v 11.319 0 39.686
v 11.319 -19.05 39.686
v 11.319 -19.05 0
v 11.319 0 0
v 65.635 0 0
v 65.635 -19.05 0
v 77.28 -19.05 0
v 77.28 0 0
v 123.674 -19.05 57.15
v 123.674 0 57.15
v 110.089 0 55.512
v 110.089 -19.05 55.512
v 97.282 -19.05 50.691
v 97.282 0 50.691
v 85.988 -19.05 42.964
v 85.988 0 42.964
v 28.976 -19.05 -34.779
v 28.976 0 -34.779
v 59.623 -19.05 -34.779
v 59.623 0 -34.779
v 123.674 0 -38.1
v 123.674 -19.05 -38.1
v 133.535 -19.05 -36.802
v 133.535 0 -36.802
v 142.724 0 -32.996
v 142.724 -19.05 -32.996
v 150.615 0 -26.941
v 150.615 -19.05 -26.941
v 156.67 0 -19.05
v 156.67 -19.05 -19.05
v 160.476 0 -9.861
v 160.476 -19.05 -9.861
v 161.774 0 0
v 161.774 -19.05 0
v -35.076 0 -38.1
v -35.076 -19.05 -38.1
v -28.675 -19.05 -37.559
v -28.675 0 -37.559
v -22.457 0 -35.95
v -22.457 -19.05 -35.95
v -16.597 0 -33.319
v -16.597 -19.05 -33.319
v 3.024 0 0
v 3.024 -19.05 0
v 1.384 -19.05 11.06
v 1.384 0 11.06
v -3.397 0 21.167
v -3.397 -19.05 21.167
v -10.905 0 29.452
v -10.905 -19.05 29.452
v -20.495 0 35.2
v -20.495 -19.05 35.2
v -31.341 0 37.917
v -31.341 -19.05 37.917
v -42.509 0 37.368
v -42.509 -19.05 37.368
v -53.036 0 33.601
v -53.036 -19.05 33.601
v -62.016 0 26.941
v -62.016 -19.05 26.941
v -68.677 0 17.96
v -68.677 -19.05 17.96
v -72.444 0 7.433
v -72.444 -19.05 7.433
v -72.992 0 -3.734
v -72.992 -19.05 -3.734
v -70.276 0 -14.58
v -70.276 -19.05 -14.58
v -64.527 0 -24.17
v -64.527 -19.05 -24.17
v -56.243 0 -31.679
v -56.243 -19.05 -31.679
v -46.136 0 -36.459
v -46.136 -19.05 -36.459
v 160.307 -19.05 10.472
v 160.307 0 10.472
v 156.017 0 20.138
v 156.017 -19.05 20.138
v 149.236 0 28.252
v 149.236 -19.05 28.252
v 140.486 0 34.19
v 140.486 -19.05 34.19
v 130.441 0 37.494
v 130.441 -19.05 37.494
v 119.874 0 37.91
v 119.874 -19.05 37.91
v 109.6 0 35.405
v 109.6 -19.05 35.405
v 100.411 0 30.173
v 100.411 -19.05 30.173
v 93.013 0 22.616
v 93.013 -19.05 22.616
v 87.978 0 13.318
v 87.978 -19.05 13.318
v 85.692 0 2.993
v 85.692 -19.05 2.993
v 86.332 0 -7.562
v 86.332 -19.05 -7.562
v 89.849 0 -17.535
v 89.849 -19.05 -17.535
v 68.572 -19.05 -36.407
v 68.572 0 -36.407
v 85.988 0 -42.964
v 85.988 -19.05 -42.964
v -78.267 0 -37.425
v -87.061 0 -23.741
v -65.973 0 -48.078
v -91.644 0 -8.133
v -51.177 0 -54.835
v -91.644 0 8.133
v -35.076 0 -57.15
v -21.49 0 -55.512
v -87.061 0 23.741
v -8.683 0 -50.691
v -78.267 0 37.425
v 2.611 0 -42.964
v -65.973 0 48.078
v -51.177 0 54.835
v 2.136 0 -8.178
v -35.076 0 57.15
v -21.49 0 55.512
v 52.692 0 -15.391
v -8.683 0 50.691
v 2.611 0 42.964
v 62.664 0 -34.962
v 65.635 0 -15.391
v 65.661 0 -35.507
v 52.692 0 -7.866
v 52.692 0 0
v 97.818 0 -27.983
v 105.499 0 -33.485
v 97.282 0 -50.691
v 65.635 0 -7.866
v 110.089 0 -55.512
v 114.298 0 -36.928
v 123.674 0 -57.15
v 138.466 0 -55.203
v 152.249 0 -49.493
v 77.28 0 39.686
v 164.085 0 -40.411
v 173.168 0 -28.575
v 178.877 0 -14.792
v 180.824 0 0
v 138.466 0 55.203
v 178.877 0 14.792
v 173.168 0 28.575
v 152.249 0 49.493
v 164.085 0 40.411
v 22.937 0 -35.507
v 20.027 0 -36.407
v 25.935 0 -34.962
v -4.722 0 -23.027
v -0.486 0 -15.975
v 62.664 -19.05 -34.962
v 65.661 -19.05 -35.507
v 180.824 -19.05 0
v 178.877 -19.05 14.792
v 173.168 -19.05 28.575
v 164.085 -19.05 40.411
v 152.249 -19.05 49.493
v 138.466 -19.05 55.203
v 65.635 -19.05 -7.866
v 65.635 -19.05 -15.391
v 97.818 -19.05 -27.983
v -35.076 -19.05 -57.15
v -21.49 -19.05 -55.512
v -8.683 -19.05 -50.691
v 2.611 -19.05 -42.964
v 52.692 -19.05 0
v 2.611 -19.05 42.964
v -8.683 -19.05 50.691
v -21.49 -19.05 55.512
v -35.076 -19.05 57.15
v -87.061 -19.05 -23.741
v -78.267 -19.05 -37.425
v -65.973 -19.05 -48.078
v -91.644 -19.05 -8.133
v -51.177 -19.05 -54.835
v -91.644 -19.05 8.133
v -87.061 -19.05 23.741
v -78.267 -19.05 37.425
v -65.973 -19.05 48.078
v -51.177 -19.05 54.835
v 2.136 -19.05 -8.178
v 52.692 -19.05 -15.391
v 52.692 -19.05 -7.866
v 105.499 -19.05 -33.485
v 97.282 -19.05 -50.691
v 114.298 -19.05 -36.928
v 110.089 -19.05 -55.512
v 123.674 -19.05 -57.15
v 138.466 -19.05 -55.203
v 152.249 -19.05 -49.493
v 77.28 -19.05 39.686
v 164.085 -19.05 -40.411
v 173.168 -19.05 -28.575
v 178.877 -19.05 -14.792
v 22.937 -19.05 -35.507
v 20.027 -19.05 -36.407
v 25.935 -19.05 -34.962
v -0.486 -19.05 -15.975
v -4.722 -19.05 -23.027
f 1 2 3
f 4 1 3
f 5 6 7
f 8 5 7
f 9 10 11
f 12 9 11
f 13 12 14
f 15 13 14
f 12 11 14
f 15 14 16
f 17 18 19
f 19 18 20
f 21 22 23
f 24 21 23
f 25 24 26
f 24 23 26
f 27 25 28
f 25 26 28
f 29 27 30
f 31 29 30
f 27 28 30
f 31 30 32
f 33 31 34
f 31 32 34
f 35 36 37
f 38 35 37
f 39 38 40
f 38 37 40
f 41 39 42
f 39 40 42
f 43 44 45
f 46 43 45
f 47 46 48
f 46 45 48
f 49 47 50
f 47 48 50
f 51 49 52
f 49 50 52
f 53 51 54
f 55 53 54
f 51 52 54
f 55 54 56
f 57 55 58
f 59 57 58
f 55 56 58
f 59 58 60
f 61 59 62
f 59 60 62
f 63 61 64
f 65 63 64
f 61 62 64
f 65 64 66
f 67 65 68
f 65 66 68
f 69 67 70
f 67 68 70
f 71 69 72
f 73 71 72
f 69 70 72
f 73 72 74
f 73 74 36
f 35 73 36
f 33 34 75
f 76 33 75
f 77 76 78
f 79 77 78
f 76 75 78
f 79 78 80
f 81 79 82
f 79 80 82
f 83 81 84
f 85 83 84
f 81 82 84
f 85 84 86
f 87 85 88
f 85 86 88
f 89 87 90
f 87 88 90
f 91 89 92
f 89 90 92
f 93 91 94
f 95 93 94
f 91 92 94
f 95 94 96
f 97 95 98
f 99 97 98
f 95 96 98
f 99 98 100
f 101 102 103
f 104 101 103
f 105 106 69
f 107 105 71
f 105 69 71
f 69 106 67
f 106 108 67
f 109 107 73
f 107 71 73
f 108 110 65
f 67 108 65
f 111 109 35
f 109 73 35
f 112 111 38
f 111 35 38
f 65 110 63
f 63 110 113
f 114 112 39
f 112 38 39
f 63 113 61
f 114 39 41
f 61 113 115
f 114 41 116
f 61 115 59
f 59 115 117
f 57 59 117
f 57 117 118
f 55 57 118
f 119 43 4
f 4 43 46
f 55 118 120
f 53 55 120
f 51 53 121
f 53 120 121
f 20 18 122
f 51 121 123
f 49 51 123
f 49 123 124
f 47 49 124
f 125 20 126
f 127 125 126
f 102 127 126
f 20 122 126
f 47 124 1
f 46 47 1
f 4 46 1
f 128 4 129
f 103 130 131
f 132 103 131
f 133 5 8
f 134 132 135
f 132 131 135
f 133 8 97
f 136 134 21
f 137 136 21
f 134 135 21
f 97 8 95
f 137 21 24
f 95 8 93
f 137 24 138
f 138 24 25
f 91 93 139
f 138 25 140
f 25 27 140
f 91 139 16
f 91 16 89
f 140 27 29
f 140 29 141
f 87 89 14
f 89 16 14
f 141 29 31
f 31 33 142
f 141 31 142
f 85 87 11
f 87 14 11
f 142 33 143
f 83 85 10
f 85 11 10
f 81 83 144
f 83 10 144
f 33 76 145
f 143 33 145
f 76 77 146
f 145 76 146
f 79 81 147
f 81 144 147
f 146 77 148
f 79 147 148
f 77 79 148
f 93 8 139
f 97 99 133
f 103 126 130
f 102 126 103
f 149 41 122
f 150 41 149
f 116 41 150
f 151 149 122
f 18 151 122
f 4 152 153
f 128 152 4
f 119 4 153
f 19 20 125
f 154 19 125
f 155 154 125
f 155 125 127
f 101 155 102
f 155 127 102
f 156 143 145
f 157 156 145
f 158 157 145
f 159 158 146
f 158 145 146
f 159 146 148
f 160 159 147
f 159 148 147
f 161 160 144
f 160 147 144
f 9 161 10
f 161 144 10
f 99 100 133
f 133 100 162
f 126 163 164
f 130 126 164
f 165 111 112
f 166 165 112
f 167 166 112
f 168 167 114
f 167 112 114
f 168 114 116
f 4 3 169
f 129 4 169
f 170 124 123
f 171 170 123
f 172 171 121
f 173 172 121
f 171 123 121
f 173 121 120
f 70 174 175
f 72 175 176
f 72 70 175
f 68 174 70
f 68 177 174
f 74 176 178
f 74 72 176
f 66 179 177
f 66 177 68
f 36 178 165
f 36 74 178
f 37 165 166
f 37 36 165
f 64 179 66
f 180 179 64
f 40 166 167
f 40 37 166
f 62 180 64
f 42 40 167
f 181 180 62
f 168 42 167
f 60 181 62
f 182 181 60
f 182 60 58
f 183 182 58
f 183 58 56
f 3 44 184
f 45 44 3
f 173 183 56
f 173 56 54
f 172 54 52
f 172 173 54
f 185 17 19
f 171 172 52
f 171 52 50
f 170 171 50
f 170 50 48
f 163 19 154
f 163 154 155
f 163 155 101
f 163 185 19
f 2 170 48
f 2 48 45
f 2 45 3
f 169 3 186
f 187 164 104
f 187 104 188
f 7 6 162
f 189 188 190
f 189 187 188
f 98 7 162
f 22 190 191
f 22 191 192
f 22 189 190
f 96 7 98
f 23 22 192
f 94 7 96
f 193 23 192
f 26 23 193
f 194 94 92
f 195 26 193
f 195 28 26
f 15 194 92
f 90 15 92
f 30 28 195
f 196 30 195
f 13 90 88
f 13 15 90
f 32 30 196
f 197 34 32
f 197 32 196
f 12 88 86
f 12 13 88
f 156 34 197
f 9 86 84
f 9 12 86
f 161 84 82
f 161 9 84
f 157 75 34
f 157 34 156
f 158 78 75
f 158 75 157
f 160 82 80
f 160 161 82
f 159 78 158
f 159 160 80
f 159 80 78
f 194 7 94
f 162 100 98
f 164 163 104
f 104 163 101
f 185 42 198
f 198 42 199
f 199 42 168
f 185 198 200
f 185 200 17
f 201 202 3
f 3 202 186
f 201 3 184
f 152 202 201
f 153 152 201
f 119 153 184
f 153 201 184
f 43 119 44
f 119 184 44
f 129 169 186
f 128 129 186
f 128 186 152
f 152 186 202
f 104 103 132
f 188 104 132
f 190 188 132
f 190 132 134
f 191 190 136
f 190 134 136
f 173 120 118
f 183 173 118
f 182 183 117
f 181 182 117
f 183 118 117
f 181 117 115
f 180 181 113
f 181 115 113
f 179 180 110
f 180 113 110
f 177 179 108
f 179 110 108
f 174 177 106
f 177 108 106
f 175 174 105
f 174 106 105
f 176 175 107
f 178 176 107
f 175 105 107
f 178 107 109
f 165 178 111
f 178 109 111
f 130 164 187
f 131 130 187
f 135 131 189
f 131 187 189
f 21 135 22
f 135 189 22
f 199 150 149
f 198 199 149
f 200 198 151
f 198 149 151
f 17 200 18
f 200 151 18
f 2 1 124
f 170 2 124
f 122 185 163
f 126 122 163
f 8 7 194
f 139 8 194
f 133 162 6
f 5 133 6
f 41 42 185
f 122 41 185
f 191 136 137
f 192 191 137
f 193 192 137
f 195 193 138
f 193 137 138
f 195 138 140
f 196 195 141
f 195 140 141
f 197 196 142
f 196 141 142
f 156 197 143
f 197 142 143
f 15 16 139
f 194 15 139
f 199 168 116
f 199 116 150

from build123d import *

# Parameters (mm, degrees)
F1_DEPTH = 19.05
F3_DEPTH = 25.4


with BuildPart() as f1:
    # F0 (on Front) → F1 (new body)
    with BuildSketch(Plane.XZ):
        with BuildLine():
            Line((20.027097595, 36.4074036121), (2.6105293283, 42.9636023111))
            ThreePointArc((2.6105293283, 42.9636023111), (16.9814393634, 23.5834144733), (22.0743066938, 0))
            ThreePointArc((22.0743066938, 0), (16.9814393634, -23.5834144733), (2.6105293283, -42.9636023111))
            Line((2.6105293283, -42.9636023111), (20.027097595, -36.4074036121))
            ThreePointArc((20.027097595, -36.4074036121), (24.4278254251, -35.189367606), (28.975523916, -34.7789341976))
            Line((28.975523916, -34.7789341976), (59.6230894717, -34.7789341976))
            ThreePointArc((59.6230894717, -34.7789341976), (64.1707879626, -35.189367606), (68.5715157927, -36.4074036121))
            Line((68.5715157927, -36.4074036121), (85.9880840594, -42.9636023111))
            ThreePointArc((85.9880840594, -42.9636023111), (66.5243066938, 0), (85.9880840594, 42.9636023111))
            Line((85.9880840594, 42.9636023111), (68.5715157927, 36.4074036121))
            ThreePointArc((68.5715157927, 36.4074036121), (64.1707879626, 35.189367606), (59.6230894717, 34.7789341976))
            Line((59.6230894717, 34.7789341976), (28.975523916, 34.7789341976))
            ThreePointArc((28.975523916, 34.7789341976), (24.4278254251, 35.189367606), (20.027097595, 36.4074036121))
        make_face()
        with BuildLine():
            ThreePointArc((2.6105293283, 42.9636023111), (-14.941734084, 53.4859438174), (-35.0756933062, 57.15))
            Line((-35.0756933062, 57.15), (2.6105293283, 42.9636023111))
        make_face()
        with BuildLine():
            Line((123.6743066938, 57.15), (85.9880840594, 42.9636023111))
            ThreePointArc((85.9880840594, 42.9636023111), (66.5243066938, 0), (85.9880840594, -42.9636023111))
            Line((85.9880840594, -42.9636023111), (123.6743066938, -57.15))
            ThreePointArc((123.6743066938, -57.15), (164.0854592386, -40.4111525448), (180.8243066938, 0))
            ThreePointArc((180.8243066938, 0), (164.0854592386, 40.4111525448), (123.6743066938, 57.15))
        make_face()
        with BuildLine():
            ThreePointArc((123.6743066938, 57.15), (103.5403474717, 53.4859438174), (85.9880840594, 42.9636023111))
            Line((85.9880840594, 42.9636023111), (123.6743066938, 57.15))
        make_face()
        with BuildLine():
            Line((2.6105293283, 42.9636023111), (-35.0756933062, 57.15))
            ThreePointArc((-35.0756933062, 57.15), (-92.2256933062, 0), (-35.0756933062, -57.15))
            Line((-35.0756933062, -57.15), (2.6105293283, -42.9636023111))
            ThreePointArc((2.6105293283, -42.9636023111), (16.9814393634, -23.5834144733), (22.0743066938, 0))
            ThreePointArc((22.0743066938, 0), (16.9814393634, 23.5834144733), (2.6105293283, 42.9636023111))
        make_face()
        with BuildLine():
            Line((2.6105293283, -42.9636023111), (-35.0756933062, -57.15))
            ThreePointArc((-35.0756933062, -57.15), (-14.941734084, -53.4859438174), (2.6105293283, -42.9636023111))
        make_face()
        with BuildLine():
            Line((123.6743066938, -57.15), (85.9880840594, -42.9636023111))
            ThreePointArc((85.9880840594, -42.9636023111), (103.5403474717, -53.4859438174), (123.6743066938, -57.15))
        make_face()
    extrude(amount=F1_DEPTH)

    # F2 (on face) → F3 (cut)
    with BuildSketch(Plane.XZ.offset(19.05)):
        with BuildLine():
            ThreePointArc((-4.721551, -23.0268548625), (1.0359587044, -12.1473696358), (3.0243066938, 0))
            ThreePointArc((3.0243066938, 0), (-62.0164616694, 26.9407683632), (-35.0756933062, -38.1))
            Line((-35.0756933062, -38.1), (-35.0756933062, -31.0422573239))
            Line((-35.0756933062, -31.0422573239), (-4.721551, -23.0268548625))
        make_face()
        with BuildLine():
            Line((-35.0756933062, -31.0422573239), (-35.0756933062, -38.1))
            Line((-35.0756933062, -38.1), (-16.5966969086, -33.3187138428))
            ThreePointArc((-16.5966969086, -33.3187138428), (-10.1227486056, -28.7916750254), (-4.721551, -23.0268548625))
            Line((-4.721551, -23.0268548625), (-35.0756933062, -31.0422573239))
        make_face()
        with BuildLine():
            Line((-16.5966969086, -33.3187138428), (-35.0756933062, -38.1))
            ThreePointArc((-35.0756933062, -38.1), (-25.5319256385, -36.8853154888), (-16.5966969086, -33.3187138428))
        make_face()
        with BuildLine():
            Line((52.6924617589, -7.8659448773), (-4.721551, -23.0268548625))
            ThreePointArc((-4.721551, -23.0268548625), (-10.1227486056, -28.7916750254), (-16.5966969086, -33.3187138428))
            Line((-16.5966969086, -33.3187138428), (52.6924617589, -15.3907220811))
            Line((52.6924617589, -15.3907220811), (65.6350776553, -15.3907220811))
            Line((65.6350776553, -15.3907220811), (97.817716181, -27.9829720911))
            ThreePointArc((97.817716181, -27.9829720911), (93.3797600536, -23.1052038265), (89.8493835117, -17.5352380003))
            Line((89.8493835117, -17.5352380003), (65.6350776553, -7.8659448773))
            Line((65.6350776553, -7.8659448773), (65.6350776553, 0))
            Line((65.6350776553, 0), (52.6924617589, 0))
            Line((52.6924617589, 0), (52.6924617589, -7.8659448773))
        make_face()
        with BuildLine():
            Line((11.3188134617, 0), (52.6924617589, 0))
            Line((52.6924617589, 0), (65.6350776553, 0))
            Line((65.6350776553, 0), (77.279799926, 0))
            Line((77.279799926, 0), (77.279799926, 39.6855029616))
            Line((77.279799926, 39.6855029616), (68.5715157927, 36.4074036121))
            ThreePointArc((68.5715157927, 36.4074036121), (64.1707879626, 35.189367606), (59.6230894717, 34.7789341976))
            Line((59.6230894717, 34.7789341976), (28.975523916, 34.7789341976))
            ThreePointArc((28.975523916, 34.7789341976), (24.4278254251, 35.189367606), (20.027097595, 36.4074036121))
            Line((20.027097595, 36.4074036121), (11.3188134617, 39.6855029616))
            Line((11.3188134617, 39.6855029616), (11.3188134617, 0))
        make_face()
        with BuildLine():
            ThreePointArc((161.7743066938, 0), (114.6498835333, 37.0158045518), (89.8493835117, -17.5352380003))
            Line((89.8493835117, -17.5352380003), (123.6743066938, -31.0422573239))
            Line((123.6743066938, -31.0422573239), (123.6743066938, -38.1))
            ThreePointArc((123.6743066938, -38.1), (150.615075057, -26.9407683632), (161.7743066938, 0))
        make_face()
        with BuildLine():
            Line((123.6743066938, -38.1), (97.817716181, -27.9829720911))
            ThreePointArc((97.817716181, -27.9829720911), (109.791605888, -35.4807076922), (123.6743066938, -38.1))
        make_face()
        with BuildLine():
            ThreePointArc((89.8493835117, -17.5352380003), (93.3797600536, -23.1052038265), (97.817716181, -27.9829720911))
            Line((97.817716181, -27.9829720911), (123.6743066938, -38.1))
            Line((123.6743066938, -38.1), (123.6743066938, -31.0422573239))
            Line((123.6743066938, -31.0422573239), (89.8493835117, -17.5352380003))
        make_face()
    extrude(amount=-F3_DEPTH, mode=Mode.SUBTRACT)


solid = f1.part
